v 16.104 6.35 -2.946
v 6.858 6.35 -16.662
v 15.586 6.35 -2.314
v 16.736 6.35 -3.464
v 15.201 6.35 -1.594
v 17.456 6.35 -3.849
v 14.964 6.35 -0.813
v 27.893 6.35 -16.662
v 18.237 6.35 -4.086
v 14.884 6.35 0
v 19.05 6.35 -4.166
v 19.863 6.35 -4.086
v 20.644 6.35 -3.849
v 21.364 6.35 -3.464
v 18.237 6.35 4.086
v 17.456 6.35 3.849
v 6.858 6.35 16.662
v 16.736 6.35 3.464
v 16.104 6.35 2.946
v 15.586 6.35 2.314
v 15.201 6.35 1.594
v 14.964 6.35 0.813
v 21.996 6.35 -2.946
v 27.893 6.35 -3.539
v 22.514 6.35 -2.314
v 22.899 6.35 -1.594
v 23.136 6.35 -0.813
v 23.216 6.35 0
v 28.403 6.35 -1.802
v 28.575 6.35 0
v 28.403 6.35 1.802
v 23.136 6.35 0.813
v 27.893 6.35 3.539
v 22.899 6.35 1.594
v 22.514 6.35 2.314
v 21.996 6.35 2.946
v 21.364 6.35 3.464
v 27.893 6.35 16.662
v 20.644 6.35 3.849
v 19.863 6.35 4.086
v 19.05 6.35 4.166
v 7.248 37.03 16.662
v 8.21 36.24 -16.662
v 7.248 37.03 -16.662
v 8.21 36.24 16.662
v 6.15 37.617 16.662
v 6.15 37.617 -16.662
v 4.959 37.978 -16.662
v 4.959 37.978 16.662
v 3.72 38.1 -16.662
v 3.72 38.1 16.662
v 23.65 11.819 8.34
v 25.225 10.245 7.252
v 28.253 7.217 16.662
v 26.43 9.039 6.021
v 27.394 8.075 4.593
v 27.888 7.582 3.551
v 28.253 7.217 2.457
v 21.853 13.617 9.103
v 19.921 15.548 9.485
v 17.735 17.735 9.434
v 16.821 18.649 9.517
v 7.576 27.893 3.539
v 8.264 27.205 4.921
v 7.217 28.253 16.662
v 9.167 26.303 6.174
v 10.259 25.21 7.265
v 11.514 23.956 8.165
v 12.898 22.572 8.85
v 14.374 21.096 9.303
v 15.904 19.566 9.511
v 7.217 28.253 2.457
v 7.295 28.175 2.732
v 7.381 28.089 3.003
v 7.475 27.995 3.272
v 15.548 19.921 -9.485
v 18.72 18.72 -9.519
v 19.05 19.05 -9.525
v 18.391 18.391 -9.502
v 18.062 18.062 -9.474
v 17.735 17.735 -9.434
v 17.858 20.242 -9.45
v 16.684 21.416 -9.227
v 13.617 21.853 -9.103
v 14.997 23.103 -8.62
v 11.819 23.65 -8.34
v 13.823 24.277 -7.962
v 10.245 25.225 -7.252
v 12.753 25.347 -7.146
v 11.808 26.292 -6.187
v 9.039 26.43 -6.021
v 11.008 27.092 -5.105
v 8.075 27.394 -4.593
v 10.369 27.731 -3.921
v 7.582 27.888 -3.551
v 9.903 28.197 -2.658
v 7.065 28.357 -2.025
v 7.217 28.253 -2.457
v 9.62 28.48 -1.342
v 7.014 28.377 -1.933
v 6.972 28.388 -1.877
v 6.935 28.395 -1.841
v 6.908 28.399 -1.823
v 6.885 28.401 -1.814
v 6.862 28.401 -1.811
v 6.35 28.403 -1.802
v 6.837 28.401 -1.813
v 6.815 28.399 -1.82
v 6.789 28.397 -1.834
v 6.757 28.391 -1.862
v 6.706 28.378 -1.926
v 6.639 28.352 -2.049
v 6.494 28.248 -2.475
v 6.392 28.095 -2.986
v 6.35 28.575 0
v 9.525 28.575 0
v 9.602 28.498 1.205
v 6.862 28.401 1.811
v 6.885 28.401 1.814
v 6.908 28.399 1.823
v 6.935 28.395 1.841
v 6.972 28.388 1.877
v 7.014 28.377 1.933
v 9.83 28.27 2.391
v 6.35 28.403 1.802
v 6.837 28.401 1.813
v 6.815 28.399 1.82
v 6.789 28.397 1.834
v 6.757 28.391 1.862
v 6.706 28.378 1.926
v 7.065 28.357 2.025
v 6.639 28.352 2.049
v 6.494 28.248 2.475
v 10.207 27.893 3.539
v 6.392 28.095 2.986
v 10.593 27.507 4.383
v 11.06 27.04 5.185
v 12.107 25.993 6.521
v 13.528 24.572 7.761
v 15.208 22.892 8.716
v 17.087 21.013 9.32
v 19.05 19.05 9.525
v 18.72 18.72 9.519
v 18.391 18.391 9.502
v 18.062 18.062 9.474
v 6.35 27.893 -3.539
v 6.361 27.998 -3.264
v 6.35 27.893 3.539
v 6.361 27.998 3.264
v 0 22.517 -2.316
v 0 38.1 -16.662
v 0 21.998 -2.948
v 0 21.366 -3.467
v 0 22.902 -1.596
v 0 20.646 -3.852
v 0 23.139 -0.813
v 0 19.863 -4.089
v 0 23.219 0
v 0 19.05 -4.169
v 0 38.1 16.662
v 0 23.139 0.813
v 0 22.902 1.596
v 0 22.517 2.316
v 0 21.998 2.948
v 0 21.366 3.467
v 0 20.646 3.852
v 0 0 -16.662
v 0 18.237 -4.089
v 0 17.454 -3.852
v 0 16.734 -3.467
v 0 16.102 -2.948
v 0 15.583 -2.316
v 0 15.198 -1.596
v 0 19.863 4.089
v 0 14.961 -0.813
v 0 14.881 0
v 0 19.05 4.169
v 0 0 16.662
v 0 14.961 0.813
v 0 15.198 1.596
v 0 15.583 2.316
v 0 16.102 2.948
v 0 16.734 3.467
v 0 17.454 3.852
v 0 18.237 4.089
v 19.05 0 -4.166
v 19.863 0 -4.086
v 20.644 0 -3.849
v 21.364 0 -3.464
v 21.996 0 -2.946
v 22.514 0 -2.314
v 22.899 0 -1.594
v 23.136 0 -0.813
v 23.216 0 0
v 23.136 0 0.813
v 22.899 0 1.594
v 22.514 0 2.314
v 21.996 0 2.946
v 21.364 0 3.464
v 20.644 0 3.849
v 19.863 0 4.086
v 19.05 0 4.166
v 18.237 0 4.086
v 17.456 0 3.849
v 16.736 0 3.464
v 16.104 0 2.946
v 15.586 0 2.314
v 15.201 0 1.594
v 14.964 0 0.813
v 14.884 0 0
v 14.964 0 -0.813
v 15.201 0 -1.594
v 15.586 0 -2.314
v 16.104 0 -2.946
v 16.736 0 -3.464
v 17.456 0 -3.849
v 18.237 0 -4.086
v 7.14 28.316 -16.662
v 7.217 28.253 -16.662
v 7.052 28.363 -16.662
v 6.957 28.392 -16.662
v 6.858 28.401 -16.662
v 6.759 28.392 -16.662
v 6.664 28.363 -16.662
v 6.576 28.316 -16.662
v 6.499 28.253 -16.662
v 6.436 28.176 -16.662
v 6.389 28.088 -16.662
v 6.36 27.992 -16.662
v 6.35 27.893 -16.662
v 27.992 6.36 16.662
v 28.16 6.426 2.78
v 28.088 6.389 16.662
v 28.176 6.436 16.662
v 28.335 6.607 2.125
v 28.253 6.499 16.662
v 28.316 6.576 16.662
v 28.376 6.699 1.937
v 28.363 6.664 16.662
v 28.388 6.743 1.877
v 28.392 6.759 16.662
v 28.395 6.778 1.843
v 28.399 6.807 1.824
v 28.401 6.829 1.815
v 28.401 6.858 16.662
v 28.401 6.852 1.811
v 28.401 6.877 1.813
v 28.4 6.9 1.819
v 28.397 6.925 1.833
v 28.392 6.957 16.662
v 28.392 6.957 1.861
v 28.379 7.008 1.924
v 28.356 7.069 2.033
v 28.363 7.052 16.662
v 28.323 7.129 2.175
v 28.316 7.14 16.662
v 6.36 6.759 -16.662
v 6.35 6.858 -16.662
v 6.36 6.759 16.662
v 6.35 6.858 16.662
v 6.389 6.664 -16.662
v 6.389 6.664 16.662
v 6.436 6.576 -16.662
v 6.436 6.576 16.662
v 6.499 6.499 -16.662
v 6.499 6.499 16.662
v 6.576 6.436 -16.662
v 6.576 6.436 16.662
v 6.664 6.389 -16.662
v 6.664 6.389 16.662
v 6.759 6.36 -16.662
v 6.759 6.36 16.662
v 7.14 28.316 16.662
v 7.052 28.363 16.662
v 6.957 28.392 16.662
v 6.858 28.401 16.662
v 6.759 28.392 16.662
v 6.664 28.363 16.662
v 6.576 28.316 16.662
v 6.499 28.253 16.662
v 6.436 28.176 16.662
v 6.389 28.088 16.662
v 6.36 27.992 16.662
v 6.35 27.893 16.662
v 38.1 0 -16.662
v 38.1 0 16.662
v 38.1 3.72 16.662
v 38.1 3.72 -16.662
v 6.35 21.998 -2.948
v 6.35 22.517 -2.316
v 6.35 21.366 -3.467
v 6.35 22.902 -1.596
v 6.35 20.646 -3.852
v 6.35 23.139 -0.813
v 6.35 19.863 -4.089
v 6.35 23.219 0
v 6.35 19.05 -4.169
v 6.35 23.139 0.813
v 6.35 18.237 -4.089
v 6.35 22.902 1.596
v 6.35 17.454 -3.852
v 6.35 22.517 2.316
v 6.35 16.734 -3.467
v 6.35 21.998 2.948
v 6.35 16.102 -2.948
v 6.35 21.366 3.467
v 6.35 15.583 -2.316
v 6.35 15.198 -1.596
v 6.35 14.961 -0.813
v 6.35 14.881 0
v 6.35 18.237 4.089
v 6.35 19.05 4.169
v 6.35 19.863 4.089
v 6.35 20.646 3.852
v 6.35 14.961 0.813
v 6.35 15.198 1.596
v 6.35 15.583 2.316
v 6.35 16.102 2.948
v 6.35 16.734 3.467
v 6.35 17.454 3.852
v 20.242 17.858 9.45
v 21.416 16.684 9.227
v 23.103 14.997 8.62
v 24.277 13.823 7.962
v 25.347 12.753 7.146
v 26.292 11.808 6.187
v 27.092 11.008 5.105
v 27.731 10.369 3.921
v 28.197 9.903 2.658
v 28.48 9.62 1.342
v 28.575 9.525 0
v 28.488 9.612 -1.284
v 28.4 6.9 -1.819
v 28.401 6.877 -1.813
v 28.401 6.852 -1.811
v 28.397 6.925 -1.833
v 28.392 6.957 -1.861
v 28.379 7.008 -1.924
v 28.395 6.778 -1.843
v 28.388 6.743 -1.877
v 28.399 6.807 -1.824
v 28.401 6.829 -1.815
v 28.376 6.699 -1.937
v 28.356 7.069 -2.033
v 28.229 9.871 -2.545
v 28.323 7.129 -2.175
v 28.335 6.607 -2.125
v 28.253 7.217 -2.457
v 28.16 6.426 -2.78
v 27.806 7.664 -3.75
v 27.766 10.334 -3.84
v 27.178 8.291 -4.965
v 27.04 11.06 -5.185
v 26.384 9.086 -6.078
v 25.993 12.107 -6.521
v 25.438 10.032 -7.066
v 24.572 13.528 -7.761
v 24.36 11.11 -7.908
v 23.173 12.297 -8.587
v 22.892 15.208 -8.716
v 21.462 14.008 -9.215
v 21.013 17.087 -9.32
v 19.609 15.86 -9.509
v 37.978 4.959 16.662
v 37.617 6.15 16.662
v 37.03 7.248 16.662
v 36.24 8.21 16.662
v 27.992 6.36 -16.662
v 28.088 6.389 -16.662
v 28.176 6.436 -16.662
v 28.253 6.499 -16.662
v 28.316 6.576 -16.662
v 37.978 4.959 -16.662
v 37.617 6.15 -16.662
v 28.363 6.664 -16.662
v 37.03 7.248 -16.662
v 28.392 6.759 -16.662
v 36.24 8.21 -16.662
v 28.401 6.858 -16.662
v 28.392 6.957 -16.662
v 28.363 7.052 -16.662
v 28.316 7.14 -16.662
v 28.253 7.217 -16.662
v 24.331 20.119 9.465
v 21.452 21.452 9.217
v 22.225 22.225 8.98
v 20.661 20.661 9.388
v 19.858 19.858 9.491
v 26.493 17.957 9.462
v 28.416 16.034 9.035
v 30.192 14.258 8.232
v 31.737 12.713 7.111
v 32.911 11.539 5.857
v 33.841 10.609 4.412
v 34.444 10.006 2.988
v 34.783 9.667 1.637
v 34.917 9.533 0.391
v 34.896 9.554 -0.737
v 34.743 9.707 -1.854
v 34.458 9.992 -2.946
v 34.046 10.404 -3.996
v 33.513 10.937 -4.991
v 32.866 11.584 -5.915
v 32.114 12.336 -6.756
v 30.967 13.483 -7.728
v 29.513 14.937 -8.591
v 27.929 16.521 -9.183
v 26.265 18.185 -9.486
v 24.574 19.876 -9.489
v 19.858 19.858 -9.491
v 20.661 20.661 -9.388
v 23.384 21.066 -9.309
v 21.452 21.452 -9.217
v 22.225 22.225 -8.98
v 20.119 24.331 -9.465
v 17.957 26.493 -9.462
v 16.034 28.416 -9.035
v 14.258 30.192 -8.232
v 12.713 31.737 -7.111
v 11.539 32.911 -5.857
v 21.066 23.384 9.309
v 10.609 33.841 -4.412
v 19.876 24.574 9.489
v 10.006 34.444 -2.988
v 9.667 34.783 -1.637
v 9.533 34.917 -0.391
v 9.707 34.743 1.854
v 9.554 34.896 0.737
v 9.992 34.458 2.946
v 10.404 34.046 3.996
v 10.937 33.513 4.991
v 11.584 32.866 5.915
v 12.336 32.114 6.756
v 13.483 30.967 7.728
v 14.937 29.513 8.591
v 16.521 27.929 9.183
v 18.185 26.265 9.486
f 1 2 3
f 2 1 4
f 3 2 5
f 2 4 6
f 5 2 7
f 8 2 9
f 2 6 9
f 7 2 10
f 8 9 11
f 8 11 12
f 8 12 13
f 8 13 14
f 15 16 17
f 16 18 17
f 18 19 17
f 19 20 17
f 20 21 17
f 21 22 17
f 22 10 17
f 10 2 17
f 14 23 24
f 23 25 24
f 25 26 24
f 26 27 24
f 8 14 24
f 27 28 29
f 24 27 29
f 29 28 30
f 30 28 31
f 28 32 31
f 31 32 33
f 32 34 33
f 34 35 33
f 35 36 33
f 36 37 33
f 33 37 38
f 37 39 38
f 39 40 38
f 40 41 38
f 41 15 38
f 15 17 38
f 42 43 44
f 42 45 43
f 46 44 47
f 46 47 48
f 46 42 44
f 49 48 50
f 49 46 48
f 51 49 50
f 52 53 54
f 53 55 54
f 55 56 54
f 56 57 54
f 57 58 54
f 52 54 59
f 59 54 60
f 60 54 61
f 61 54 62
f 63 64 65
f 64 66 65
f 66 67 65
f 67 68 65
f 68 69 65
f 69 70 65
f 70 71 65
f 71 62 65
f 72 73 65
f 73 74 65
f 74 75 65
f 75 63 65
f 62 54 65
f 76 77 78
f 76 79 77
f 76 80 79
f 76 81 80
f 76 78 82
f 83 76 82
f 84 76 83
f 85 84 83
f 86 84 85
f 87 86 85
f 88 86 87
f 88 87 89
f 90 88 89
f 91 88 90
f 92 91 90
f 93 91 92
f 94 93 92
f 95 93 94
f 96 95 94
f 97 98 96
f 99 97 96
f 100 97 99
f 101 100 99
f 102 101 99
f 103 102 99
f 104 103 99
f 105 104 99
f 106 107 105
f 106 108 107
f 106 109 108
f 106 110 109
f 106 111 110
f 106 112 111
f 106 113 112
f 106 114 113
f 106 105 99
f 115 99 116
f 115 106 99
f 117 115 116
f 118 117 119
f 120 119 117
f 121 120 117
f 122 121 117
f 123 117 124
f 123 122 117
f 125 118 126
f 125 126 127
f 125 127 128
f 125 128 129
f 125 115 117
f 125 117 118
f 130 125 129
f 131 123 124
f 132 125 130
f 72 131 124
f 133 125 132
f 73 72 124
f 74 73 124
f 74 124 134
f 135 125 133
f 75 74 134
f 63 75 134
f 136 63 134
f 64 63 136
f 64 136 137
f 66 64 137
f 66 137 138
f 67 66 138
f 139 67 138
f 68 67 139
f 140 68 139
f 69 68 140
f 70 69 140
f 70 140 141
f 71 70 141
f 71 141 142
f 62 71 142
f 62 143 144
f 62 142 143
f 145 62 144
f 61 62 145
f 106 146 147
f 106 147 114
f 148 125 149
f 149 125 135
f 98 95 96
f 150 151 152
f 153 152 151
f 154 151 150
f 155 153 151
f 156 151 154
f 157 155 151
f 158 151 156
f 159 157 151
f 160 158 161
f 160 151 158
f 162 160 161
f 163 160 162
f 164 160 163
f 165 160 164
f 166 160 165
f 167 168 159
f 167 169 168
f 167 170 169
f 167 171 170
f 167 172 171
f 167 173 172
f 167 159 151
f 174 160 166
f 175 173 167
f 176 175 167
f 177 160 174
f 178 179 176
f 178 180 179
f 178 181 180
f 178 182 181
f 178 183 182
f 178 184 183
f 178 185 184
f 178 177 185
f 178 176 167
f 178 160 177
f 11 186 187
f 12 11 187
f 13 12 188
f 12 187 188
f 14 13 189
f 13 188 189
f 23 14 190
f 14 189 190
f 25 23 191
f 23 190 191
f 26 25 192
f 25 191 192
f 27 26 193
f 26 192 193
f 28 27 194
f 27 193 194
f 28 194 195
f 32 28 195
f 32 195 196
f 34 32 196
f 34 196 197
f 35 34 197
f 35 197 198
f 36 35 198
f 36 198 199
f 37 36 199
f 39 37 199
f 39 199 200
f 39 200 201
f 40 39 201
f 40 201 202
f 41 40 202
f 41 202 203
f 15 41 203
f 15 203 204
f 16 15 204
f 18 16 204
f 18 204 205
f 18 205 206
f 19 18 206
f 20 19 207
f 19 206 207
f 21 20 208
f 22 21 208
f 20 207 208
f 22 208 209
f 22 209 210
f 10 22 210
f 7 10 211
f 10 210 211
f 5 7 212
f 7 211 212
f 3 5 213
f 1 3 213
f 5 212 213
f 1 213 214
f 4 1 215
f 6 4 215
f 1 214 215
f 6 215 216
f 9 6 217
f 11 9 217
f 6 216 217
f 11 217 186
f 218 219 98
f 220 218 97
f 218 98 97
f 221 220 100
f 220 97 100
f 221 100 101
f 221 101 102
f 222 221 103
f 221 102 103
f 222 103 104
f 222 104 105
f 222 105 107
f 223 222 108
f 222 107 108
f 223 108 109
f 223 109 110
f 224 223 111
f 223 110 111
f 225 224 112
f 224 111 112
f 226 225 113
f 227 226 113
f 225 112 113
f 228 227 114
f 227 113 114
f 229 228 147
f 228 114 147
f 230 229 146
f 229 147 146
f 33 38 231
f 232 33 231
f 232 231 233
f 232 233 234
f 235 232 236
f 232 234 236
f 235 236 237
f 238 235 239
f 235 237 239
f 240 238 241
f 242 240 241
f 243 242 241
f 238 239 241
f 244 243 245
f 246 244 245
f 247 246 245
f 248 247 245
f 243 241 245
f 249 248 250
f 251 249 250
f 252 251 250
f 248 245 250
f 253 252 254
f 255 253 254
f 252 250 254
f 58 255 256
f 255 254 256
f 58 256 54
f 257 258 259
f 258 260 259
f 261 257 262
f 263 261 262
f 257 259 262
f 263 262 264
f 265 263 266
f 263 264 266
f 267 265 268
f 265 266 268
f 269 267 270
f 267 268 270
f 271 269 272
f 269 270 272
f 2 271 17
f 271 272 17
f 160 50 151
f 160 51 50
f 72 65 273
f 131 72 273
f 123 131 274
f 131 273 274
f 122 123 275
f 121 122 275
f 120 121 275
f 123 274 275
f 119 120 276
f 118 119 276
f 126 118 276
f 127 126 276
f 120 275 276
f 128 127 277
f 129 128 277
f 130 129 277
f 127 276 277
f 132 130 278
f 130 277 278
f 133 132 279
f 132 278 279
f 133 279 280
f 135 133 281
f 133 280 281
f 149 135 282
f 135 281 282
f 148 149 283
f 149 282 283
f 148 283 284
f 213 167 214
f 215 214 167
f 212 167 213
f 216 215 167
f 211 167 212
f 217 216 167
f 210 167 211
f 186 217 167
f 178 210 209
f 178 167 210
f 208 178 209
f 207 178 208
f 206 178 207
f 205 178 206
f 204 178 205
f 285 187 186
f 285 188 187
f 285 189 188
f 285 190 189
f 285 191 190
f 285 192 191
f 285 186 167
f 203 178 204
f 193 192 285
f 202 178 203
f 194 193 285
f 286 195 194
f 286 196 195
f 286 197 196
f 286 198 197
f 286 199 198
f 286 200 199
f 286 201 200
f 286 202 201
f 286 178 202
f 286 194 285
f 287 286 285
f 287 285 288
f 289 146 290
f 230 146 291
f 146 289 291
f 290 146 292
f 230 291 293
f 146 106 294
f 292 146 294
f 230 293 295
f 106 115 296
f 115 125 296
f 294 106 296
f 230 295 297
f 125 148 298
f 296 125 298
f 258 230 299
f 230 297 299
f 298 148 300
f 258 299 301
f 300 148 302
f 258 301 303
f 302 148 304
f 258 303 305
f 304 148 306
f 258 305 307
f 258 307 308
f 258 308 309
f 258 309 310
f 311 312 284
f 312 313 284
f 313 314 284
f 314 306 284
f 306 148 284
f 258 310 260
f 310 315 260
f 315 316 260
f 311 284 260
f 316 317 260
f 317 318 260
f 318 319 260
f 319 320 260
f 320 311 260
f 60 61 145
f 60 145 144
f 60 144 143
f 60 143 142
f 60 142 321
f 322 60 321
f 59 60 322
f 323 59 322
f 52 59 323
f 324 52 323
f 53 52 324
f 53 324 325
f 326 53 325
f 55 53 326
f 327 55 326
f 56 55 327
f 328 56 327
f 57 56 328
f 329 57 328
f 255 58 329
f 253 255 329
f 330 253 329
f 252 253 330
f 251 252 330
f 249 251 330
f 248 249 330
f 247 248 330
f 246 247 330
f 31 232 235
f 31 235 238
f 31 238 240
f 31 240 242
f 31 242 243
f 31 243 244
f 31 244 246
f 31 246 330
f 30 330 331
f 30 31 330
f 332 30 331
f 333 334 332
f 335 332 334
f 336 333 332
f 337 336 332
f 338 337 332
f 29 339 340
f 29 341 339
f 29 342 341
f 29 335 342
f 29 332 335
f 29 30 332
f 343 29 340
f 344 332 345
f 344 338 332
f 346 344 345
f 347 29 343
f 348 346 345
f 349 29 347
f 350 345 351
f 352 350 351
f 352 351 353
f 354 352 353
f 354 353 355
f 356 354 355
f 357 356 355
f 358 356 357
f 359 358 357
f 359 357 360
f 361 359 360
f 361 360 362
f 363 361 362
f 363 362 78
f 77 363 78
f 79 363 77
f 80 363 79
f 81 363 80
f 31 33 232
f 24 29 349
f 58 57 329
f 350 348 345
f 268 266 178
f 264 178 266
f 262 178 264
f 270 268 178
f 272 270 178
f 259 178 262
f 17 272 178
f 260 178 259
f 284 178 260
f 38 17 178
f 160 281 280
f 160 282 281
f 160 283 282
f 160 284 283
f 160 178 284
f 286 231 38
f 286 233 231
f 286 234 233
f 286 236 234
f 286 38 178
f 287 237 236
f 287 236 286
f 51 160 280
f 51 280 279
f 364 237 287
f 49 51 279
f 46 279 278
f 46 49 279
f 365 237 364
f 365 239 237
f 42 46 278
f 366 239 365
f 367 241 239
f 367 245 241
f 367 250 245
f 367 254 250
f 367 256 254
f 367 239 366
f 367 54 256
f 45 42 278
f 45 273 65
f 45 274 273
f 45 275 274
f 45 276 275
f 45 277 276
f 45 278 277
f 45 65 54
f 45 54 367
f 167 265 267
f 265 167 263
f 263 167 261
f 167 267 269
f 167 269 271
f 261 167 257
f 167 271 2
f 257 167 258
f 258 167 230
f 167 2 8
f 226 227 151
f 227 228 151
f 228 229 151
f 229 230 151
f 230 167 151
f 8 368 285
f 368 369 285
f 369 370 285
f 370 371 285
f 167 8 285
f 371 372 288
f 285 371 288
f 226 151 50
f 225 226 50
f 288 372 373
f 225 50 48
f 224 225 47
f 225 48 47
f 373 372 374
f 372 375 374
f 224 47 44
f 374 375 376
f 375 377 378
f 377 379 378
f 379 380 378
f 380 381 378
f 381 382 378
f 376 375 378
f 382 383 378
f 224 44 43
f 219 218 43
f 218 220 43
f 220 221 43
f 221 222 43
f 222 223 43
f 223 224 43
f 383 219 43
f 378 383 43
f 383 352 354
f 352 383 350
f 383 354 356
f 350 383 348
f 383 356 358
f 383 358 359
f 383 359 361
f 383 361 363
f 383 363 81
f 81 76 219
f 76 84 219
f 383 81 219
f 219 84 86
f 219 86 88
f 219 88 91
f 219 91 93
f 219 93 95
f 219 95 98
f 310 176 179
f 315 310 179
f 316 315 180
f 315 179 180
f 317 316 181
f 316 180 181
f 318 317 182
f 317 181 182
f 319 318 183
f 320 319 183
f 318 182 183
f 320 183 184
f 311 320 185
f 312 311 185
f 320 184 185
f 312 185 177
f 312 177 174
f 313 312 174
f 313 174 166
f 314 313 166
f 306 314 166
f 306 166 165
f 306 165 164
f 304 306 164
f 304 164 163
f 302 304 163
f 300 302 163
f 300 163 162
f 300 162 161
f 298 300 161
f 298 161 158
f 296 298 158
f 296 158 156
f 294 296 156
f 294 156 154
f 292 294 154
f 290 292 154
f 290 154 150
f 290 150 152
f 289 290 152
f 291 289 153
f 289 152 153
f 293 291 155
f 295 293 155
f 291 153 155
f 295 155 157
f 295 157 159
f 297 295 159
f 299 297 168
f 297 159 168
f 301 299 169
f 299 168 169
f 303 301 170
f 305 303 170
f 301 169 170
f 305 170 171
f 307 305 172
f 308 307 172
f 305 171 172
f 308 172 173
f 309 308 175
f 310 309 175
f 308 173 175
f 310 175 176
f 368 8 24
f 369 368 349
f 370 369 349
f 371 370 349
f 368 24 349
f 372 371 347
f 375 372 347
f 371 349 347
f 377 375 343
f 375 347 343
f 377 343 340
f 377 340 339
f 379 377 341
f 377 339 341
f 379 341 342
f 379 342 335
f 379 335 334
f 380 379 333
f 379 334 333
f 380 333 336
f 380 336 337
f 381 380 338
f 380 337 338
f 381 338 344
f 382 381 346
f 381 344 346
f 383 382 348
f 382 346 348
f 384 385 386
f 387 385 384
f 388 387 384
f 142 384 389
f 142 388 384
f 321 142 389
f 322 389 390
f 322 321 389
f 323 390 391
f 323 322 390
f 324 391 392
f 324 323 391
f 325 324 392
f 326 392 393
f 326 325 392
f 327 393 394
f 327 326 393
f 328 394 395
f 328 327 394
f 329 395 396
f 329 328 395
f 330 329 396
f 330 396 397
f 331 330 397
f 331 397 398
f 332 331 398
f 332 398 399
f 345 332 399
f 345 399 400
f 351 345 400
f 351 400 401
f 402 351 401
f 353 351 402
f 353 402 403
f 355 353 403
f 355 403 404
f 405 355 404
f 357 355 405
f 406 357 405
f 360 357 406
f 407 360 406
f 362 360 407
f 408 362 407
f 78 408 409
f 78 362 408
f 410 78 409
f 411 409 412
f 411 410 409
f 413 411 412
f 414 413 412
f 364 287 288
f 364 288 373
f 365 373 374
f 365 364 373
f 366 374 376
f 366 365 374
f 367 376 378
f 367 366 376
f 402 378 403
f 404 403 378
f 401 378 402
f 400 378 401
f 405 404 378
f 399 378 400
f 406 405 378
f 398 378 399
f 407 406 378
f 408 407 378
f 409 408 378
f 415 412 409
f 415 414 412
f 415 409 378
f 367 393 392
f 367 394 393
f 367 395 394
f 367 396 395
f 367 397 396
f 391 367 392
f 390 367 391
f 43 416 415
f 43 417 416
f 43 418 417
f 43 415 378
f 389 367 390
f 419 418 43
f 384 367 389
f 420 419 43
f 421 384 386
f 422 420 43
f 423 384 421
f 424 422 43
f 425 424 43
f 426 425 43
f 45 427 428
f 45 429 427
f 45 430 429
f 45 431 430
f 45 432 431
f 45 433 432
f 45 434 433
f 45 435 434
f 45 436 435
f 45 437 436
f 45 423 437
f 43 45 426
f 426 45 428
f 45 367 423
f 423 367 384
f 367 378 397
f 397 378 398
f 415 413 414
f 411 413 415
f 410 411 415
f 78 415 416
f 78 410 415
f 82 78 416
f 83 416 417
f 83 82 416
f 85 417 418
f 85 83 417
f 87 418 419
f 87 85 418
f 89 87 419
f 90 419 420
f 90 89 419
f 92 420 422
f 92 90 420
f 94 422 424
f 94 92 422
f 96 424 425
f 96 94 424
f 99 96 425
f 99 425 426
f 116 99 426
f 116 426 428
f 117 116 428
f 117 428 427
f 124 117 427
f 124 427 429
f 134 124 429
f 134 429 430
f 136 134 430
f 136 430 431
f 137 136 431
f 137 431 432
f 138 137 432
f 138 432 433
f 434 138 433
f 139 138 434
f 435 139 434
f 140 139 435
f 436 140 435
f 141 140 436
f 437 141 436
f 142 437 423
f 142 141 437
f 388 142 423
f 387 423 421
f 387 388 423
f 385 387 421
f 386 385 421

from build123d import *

# Parameters (mm, degrees)
BOSS_EXTRUDE2_DEPTH = 16.6624
CUT_EXTRUDE1_REACH  = 58.399
SKETCH3_R           = 4.16941
SKETCH4_R           = 9.525
CUT_EXTRUDE2_DEPTH  = 36.068
CUT_EXTRUDE3_REACH  = 58.399
SKETCH5_R           = 4.1656
SKETCH6_R           = 9.525
CUT_EXTRUDE4_DEPTH  = 36.068


with BuildPart() as part:
    # Sketch2 → Boss-Extrude2 (new, symmetric)
    with BuildSketch(Plane.XY):
        with BuildLine():
            Line((0, 38.1), (0, 0))
            Line((0, 0), (38.1, 0))
            Line((38.1, 0), (38.1, 3.719743879))
            ThreePointArc((38.1, 3.719743879), (37.616635031, 6.149783674), (36.240128061, 8.209871939))
            Line((36.240128061, 8.209871939), (8.209871939, 36.240128061))
            ThreePointArc((8.209871939, 36.240128061), (6.149783674, 37.616635031), (3.719743879, 38.1))
            Line((3.719743879, 38.1), (0, 38.1))
        make_face()
        with BuildLine():
            Line((6.35, 27.893323389), (6.35, 6.858))
            ThreePointArc((6.35, 6.858), (6.498789755, 6.498789755), (6.858, 6.35))
            Line((6.858, 6.35), (27.893323389, 6.35))
            ThreePointArc((27.893323389, 6.35), (28.362654192, 6.663596816), (28.252533634, 7.217210245))
            Line((28.252533634, 7.217210245), (7.217210245, 28.252533634))
            ThreePointArc((7.217210245, 28.252533634), (6.663596816, 28.362654192), (6.35, 27.893323389))
        make_face(mode=Mode.SUBTRACT)
    extrude(amount=BOSS_EXTRUDE2_DEPTH, both=True)

    # Sketch3 → Cut-Extrude1 (cut, up to next)
    with BuildSketch(Plane.ZY, mode=Mode.PRIVATE) as cut_extrude1_sk1:
        with Locations(Location((0, 19.05, 0), (0, 0, 270))):
            Circle(SKETCH3_R)
    cut_extrude1_tool1 = extrude(cut_extrude1_sk1.sketch, amount=-CUT_EXTRUDE1_REACH, mode=Mode.PRIVATE) & part.part
    add(cut_extrude1_tool1.solids().sort_by_distance((0, 19.05, 0))[0], mode=Mode.SUBTRACT)

    # Sketch4 → Cut-Extrude2 (cut)
    with BuildSketch(Plane(origin=(6.35, 0, 0), x_dir=(0, 0, -1), z_dir=(1, 0, 0))):
        with Locations(Location((0, 19.05, 0), (0, 0, 111.808163998))):
            Circle(SKETCH4_R)
    extrude(amount=CUT_EXTRUDE2_DEPTH, mode=Mode.SUBTRACT)

    # Sketch5 → Cut-Extrude3 (cut, up to next)
    with BuildSketch(Plane.XZ, mode=Mode.PRIVATE) as cut_extrude3_sk1:
        with Locations(Location((19.05, 0, 0), (0, 0, 270))):
            Circle(SKETCH5_R)
    cut_extrude3_tool1 = extrude(cut_extrude3_sk1.sketch, amount=-CUT_EXTRUDE3_REACH, mode=Mode.PRIVATE) & part.part
    add(cut_extrude3_tool1.solids().sort_by_distance((19.05, 0, 0))[0], mode=Mode.SUBTRACT)

    # Sketch6 → Cut-Extrude4 (cut)
    with BuildSketch(Plane(origin=(0, 6.35, 0), x_dir=(1, 0, 0), z_dir=(0, 1, 0))):
        with Locations((19.05, 0)):
            Circle(SKETCH6_R)
    extrude(amount=CUT_EXTRUDE4_DEPTH, mode=Mode.SUBTRACT)


solid = part.part
